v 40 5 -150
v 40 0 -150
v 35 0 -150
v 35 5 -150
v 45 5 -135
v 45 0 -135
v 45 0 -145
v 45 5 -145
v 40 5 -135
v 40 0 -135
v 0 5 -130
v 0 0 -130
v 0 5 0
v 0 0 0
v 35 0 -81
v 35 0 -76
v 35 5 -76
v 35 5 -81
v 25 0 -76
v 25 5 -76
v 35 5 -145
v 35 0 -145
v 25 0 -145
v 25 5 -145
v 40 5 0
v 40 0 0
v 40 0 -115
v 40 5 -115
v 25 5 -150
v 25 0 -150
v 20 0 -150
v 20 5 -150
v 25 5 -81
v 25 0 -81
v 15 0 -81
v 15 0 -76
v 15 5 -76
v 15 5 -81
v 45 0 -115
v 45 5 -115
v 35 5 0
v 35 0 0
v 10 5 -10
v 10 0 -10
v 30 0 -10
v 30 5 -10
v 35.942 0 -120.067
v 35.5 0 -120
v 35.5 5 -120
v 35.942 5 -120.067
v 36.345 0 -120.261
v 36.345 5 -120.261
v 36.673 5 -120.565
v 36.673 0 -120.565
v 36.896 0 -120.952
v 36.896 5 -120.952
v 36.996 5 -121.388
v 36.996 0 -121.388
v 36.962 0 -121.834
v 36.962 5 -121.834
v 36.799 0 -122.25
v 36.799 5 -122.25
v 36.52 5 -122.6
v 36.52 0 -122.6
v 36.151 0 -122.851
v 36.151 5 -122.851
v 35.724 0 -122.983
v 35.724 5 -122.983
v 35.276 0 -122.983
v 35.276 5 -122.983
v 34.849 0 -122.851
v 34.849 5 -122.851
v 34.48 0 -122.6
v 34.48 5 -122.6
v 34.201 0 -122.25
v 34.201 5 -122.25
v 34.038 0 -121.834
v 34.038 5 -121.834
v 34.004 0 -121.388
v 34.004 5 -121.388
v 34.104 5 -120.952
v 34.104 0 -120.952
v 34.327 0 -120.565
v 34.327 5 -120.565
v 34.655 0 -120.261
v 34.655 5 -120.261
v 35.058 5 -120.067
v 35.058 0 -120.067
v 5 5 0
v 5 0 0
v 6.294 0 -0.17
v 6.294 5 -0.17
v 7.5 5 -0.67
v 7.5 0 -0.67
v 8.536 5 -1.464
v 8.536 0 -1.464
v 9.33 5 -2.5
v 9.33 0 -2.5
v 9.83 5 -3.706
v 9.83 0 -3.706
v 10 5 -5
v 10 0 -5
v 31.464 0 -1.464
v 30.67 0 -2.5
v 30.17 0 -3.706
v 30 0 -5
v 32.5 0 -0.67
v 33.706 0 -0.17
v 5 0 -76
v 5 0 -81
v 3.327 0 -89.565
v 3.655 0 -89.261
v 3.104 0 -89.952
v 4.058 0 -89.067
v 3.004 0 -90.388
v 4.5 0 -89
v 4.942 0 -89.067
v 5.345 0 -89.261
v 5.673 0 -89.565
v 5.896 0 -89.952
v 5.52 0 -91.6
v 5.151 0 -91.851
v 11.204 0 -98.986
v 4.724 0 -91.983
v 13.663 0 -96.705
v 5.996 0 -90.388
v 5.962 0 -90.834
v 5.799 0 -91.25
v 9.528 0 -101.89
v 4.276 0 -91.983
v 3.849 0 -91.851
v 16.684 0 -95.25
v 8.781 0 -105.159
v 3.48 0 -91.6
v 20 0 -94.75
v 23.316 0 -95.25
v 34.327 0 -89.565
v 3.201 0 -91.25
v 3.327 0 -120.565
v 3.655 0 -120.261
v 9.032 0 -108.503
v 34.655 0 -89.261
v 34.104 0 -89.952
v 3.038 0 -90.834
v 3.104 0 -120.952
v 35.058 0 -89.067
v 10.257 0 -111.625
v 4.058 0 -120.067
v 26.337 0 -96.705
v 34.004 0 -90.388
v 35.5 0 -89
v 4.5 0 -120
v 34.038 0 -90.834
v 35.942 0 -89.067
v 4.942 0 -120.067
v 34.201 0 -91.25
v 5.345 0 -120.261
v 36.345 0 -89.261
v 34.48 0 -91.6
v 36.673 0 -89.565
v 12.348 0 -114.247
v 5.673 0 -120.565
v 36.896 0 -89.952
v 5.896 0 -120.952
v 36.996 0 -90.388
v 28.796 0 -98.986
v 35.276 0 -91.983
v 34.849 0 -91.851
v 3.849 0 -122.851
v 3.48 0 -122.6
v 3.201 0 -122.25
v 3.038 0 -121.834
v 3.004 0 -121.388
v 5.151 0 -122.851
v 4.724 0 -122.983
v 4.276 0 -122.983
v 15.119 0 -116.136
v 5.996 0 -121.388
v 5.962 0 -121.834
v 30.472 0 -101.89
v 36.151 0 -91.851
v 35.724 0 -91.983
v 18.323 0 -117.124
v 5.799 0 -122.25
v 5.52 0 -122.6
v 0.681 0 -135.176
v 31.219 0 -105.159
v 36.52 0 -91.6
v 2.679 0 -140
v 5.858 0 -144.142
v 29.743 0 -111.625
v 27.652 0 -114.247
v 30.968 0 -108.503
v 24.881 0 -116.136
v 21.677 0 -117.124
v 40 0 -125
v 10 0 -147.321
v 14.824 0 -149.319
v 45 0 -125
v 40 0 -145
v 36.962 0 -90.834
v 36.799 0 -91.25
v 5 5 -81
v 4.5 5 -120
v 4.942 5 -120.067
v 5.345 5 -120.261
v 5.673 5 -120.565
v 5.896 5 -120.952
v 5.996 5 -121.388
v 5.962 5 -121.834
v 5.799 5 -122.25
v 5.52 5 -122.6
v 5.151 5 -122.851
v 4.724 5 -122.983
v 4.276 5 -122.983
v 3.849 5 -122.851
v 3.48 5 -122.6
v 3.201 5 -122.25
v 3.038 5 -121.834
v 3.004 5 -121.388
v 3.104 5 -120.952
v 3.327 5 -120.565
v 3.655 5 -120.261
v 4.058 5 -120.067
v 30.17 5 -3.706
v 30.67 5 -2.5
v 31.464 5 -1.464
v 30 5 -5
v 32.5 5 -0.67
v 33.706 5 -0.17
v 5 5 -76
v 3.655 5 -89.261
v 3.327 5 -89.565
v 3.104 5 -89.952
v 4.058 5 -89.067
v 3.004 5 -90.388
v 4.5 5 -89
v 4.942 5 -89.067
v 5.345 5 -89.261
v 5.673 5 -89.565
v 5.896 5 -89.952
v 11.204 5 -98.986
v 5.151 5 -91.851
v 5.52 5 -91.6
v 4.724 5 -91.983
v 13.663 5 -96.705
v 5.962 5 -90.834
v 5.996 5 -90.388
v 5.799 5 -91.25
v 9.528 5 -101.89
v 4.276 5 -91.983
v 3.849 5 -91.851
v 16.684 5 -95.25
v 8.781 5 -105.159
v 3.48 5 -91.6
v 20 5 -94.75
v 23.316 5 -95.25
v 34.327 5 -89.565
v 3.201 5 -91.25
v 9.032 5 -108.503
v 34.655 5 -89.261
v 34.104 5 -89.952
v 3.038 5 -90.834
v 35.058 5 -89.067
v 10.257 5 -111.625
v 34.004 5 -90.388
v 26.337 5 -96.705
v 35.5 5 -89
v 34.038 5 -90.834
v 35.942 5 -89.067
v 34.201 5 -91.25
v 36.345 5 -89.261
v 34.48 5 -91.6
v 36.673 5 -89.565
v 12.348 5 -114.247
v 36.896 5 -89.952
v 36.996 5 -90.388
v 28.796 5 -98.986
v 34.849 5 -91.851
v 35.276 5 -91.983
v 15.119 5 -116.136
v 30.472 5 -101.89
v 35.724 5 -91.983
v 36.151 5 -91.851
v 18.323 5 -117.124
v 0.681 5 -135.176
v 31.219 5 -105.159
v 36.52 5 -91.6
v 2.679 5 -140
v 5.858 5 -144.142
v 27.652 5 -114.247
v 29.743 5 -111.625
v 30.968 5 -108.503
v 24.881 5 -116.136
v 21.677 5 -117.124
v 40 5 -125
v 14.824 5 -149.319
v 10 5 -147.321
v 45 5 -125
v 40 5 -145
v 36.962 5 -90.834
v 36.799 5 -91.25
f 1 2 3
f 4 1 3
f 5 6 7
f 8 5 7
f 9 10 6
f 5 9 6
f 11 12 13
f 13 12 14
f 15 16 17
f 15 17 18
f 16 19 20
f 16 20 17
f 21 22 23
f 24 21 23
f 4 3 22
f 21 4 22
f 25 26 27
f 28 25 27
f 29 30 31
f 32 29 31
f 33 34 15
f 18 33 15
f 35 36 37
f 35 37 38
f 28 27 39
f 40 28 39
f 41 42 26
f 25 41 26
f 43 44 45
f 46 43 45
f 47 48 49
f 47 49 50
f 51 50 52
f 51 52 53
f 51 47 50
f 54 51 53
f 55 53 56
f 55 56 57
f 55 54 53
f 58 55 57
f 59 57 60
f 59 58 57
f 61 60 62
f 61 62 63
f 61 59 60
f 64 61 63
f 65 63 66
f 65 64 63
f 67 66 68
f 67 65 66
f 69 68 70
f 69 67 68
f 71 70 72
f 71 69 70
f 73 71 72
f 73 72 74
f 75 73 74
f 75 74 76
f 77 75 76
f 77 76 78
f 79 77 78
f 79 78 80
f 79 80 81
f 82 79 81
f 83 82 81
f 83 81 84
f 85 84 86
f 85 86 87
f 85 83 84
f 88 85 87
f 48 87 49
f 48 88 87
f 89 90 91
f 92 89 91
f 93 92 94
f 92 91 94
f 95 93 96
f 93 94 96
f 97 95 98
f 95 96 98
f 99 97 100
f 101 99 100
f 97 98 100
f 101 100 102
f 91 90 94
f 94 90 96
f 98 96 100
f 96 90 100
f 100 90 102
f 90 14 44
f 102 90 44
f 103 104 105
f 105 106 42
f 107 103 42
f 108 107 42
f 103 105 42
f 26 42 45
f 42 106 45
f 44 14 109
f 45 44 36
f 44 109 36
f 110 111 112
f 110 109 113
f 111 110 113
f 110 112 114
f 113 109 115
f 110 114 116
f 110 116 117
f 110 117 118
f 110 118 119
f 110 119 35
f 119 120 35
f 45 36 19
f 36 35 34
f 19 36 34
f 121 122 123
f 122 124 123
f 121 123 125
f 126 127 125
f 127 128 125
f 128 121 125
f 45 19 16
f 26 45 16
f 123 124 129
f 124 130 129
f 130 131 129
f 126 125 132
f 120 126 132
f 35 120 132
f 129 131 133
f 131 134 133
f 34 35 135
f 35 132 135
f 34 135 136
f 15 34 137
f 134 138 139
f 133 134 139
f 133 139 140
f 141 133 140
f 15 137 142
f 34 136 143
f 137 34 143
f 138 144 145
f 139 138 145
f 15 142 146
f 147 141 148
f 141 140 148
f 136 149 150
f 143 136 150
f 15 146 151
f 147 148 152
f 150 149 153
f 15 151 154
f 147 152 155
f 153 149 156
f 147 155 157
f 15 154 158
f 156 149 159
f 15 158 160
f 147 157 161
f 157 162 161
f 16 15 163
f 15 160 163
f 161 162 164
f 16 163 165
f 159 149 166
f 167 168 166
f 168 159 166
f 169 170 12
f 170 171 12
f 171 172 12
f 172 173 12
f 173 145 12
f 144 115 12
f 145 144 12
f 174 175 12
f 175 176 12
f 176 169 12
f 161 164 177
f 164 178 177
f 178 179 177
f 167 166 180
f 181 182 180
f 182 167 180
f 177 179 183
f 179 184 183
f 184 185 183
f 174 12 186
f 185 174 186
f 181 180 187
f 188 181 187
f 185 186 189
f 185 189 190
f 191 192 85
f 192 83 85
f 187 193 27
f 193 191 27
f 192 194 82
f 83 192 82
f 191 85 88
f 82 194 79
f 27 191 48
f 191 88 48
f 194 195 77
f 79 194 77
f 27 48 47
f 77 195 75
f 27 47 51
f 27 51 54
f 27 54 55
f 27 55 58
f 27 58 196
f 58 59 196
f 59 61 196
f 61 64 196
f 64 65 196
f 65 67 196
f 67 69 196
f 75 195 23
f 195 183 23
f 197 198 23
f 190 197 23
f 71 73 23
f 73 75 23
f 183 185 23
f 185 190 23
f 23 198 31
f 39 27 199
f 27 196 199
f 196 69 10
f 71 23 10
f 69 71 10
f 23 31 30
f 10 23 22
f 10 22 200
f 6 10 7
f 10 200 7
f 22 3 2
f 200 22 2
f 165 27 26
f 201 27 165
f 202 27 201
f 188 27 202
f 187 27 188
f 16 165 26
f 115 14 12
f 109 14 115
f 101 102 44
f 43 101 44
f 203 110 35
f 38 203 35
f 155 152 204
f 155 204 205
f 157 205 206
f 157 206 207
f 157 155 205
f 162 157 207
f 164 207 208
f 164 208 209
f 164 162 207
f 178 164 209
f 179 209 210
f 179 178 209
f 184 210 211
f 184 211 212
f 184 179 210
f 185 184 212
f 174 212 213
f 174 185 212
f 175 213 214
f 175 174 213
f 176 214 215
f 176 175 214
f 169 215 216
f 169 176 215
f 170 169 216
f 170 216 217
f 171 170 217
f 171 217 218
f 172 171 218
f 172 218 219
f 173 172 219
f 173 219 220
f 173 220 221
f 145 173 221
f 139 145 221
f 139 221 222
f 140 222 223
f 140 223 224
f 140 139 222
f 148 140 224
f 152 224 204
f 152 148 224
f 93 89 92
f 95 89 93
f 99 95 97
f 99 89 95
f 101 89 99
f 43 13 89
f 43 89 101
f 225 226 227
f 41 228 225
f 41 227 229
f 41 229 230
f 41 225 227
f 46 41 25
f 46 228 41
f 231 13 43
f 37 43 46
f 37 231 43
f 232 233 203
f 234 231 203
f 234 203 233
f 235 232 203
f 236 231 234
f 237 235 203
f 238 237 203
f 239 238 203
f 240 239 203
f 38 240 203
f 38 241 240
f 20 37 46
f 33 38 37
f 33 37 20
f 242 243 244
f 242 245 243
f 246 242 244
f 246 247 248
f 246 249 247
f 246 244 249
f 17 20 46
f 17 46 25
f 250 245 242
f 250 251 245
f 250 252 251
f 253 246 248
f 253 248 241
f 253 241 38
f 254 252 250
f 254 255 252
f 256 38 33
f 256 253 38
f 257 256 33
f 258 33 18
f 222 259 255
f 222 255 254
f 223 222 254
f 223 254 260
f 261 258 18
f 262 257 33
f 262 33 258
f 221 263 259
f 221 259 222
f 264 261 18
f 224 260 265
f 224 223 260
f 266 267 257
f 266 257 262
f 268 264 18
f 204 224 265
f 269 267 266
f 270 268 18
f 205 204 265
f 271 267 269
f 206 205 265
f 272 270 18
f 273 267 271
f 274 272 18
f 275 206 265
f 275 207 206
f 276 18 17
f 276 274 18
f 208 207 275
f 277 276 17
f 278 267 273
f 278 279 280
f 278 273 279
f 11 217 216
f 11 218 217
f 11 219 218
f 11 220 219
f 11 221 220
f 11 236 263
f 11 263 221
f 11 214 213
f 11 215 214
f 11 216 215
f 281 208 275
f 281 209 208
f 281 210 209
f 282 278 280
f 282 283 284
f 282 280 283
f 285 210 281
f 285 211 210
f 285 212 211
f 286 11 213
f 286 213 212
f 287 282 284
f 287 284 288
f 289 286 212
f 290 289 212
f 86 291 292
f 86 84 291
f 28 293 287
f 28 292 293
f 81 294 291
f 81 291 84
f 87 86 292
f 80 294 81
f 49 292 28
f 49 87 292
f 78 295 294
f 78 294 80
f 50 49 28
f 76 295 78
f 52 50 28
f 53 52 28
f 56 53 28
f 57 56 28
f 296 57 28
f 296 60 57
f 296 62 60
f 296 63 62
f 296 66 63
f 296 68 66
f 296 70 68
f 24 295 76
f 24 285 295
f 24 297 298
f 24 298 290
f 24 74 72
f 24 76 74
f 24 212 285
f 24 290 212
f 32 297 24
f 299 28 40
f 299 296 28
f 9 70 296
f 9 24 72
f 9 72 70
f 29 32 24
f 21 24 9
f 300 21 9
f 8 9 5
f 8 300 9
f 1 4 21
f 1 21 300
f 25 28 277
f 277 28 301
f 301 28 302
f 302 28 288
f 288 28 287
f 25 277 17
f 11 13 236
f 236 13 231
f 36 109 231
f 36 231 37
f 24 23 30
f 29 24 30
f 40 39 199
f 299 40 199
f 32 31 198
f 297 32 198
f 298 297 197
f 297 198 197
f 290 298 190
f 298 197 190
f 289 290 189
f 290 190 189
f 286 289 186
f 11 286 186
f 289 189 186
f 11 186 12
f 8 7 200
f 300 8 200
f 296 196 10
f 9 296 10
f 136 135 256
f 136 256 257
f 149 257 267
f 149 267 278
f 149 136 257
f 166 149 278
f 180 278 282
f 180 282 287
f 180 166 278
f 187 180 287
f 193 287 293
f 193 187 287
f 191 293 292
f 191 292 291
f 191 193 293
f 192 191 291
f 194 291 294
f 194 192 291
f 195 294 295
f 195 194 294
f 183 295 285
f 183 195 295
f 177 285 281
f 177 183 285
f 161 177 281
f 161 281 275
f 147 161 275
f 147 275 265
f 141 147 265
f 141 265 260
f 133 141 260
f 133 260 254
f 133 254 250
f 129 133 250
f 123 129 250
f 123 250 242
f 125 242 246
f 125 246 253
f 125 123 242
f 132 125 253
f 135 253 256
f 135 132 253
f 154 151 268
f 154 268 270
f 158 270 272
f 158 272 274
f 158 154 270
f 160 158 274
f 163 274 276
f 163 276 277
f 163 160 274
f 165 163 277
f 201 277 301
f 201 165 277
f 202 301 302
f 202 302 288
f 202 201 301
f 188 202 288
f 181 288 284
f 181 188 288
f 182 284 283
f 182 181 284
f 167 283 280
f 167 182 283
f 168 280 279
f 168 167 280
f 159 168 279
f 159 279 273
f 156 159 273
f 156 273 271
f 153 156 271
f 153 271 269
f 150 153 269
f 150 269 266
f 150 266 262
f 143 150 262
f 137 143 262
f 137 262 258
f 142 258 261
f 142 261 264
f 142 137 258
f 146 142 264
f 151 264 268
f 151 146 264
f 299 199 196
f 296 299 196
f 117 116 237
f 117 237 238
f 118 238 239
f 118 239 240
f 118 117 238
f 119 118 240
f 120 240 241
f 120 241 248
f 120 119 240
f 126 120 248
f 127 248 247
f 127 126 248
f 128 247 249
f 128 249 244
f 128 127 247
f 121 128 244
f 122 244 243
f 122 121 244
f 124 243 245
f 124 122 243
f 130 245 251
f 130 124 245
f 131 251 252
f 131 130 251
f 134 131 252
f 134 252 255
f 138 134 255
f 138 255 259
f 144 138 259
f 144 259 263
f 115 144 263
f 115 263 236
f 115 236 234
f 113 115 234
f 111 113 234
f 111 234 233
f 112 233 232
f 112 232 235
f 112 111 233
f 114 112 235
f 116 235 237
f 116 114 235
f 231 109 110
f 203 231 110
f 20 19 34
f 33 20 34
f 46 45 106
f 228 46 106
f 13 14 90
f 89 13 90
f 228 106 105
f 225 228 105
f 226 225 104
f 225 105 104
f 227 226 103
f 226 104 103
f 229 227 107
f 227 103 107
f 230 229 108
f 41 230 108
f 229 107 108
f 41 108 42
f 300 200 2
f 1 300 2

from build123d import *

# Parameters (mm, degrees)
SKETCH_1_R      = 11.25
SKETCH_1_R_2    = 1.5
SKETCH_1_W      = 10
SKETCH_1_H      = 5
EXTRUDE_2_DEPTH = 5


with BuildPart() as part:
    # 草图1 → 凸台-拉伸2 (new body)
    with BuildSketch(Plane(origin=(0, 0, 0), x_dir=(1, 0, 0), z_dir=(0, 1, 0))):
        with BuildLine():
            Line((10, 5), (10, 10))
            Line((10, 10), (30, 10))
            Line((30, 10), (30, 5))
            ThreePointArc((30, 5), (31.464466094, 1.464466094), (35, 0))
            Line((35, 0), (40, 0))
            Line((40, 0), (40, 115))
            Line((40, 115), (45, 115))
            Line((45, 115), (45, 125))
            Line((45, 125), (40, 125))
            Line((40, 125), (40, 135))
            Line((40, 135), (45, 135))
            Line((45, 135), (45, 145))
            Line((45, 145), (40, 145))
            Line((40, 145), (40, 150))
            Line((40, 150), (35, 150))
            Line((35, 150), (35, 145))
            Line((35, 145), (25, 145))
            Line((25, 145), (25, 150))
            Line((25, 150), (20, 150))
            ThreePointArc((20, 150), (5.857864376, 144.142135624), (0, 130))
            Line((0, 130), (0, 0))
            Line((0, 0), (5, 0))
            ThreePointArc((5, 0), (8.535533906, 1.464466094), (10, 5))
        make_face()
        with Locations(Location((20, 106, 0), (0, 0, 270))):
            Circle(SKETCH_1_R, mode=Mode.SUBTRACT)
        with Locations(Location((4.5, 121.5, 0), (0, 0, 270))):
            Circle(SKETCH_1_R_2, mode=Mode.SUBTRACT)
        with Locations(Location((35.5, 121.5, 0), (0, 0, 270))):
            Circle(SKETCH_1_R_2, mode=Mode.SUBTRACT)
        with Locations(Location((4.5, 90.5, 0), (0, 0, 270))):
            Circle(SKETCH_1_R_2, mode=Mode.SUBTRACT)
        with Locations(Location((35.5, 90.5, 0), (0, 0, 270))):
            Circle(SKETCH_1_R_2, mode=Mode.SUBTRACT)
        with Locations((10, 78.5)):
            Rectangle(SKETCH_1_W, SKETCH_1_H, mode=Mode.SUBTRACT)
        with Locations((30, 78.5)):
            Rectangle(SKETCH_1_W, SKETCH_1_H, mode=Mode.SUBTRACT)
    extrude(amount=EXTRUDE_2_DEPTH)


solid = part.part
